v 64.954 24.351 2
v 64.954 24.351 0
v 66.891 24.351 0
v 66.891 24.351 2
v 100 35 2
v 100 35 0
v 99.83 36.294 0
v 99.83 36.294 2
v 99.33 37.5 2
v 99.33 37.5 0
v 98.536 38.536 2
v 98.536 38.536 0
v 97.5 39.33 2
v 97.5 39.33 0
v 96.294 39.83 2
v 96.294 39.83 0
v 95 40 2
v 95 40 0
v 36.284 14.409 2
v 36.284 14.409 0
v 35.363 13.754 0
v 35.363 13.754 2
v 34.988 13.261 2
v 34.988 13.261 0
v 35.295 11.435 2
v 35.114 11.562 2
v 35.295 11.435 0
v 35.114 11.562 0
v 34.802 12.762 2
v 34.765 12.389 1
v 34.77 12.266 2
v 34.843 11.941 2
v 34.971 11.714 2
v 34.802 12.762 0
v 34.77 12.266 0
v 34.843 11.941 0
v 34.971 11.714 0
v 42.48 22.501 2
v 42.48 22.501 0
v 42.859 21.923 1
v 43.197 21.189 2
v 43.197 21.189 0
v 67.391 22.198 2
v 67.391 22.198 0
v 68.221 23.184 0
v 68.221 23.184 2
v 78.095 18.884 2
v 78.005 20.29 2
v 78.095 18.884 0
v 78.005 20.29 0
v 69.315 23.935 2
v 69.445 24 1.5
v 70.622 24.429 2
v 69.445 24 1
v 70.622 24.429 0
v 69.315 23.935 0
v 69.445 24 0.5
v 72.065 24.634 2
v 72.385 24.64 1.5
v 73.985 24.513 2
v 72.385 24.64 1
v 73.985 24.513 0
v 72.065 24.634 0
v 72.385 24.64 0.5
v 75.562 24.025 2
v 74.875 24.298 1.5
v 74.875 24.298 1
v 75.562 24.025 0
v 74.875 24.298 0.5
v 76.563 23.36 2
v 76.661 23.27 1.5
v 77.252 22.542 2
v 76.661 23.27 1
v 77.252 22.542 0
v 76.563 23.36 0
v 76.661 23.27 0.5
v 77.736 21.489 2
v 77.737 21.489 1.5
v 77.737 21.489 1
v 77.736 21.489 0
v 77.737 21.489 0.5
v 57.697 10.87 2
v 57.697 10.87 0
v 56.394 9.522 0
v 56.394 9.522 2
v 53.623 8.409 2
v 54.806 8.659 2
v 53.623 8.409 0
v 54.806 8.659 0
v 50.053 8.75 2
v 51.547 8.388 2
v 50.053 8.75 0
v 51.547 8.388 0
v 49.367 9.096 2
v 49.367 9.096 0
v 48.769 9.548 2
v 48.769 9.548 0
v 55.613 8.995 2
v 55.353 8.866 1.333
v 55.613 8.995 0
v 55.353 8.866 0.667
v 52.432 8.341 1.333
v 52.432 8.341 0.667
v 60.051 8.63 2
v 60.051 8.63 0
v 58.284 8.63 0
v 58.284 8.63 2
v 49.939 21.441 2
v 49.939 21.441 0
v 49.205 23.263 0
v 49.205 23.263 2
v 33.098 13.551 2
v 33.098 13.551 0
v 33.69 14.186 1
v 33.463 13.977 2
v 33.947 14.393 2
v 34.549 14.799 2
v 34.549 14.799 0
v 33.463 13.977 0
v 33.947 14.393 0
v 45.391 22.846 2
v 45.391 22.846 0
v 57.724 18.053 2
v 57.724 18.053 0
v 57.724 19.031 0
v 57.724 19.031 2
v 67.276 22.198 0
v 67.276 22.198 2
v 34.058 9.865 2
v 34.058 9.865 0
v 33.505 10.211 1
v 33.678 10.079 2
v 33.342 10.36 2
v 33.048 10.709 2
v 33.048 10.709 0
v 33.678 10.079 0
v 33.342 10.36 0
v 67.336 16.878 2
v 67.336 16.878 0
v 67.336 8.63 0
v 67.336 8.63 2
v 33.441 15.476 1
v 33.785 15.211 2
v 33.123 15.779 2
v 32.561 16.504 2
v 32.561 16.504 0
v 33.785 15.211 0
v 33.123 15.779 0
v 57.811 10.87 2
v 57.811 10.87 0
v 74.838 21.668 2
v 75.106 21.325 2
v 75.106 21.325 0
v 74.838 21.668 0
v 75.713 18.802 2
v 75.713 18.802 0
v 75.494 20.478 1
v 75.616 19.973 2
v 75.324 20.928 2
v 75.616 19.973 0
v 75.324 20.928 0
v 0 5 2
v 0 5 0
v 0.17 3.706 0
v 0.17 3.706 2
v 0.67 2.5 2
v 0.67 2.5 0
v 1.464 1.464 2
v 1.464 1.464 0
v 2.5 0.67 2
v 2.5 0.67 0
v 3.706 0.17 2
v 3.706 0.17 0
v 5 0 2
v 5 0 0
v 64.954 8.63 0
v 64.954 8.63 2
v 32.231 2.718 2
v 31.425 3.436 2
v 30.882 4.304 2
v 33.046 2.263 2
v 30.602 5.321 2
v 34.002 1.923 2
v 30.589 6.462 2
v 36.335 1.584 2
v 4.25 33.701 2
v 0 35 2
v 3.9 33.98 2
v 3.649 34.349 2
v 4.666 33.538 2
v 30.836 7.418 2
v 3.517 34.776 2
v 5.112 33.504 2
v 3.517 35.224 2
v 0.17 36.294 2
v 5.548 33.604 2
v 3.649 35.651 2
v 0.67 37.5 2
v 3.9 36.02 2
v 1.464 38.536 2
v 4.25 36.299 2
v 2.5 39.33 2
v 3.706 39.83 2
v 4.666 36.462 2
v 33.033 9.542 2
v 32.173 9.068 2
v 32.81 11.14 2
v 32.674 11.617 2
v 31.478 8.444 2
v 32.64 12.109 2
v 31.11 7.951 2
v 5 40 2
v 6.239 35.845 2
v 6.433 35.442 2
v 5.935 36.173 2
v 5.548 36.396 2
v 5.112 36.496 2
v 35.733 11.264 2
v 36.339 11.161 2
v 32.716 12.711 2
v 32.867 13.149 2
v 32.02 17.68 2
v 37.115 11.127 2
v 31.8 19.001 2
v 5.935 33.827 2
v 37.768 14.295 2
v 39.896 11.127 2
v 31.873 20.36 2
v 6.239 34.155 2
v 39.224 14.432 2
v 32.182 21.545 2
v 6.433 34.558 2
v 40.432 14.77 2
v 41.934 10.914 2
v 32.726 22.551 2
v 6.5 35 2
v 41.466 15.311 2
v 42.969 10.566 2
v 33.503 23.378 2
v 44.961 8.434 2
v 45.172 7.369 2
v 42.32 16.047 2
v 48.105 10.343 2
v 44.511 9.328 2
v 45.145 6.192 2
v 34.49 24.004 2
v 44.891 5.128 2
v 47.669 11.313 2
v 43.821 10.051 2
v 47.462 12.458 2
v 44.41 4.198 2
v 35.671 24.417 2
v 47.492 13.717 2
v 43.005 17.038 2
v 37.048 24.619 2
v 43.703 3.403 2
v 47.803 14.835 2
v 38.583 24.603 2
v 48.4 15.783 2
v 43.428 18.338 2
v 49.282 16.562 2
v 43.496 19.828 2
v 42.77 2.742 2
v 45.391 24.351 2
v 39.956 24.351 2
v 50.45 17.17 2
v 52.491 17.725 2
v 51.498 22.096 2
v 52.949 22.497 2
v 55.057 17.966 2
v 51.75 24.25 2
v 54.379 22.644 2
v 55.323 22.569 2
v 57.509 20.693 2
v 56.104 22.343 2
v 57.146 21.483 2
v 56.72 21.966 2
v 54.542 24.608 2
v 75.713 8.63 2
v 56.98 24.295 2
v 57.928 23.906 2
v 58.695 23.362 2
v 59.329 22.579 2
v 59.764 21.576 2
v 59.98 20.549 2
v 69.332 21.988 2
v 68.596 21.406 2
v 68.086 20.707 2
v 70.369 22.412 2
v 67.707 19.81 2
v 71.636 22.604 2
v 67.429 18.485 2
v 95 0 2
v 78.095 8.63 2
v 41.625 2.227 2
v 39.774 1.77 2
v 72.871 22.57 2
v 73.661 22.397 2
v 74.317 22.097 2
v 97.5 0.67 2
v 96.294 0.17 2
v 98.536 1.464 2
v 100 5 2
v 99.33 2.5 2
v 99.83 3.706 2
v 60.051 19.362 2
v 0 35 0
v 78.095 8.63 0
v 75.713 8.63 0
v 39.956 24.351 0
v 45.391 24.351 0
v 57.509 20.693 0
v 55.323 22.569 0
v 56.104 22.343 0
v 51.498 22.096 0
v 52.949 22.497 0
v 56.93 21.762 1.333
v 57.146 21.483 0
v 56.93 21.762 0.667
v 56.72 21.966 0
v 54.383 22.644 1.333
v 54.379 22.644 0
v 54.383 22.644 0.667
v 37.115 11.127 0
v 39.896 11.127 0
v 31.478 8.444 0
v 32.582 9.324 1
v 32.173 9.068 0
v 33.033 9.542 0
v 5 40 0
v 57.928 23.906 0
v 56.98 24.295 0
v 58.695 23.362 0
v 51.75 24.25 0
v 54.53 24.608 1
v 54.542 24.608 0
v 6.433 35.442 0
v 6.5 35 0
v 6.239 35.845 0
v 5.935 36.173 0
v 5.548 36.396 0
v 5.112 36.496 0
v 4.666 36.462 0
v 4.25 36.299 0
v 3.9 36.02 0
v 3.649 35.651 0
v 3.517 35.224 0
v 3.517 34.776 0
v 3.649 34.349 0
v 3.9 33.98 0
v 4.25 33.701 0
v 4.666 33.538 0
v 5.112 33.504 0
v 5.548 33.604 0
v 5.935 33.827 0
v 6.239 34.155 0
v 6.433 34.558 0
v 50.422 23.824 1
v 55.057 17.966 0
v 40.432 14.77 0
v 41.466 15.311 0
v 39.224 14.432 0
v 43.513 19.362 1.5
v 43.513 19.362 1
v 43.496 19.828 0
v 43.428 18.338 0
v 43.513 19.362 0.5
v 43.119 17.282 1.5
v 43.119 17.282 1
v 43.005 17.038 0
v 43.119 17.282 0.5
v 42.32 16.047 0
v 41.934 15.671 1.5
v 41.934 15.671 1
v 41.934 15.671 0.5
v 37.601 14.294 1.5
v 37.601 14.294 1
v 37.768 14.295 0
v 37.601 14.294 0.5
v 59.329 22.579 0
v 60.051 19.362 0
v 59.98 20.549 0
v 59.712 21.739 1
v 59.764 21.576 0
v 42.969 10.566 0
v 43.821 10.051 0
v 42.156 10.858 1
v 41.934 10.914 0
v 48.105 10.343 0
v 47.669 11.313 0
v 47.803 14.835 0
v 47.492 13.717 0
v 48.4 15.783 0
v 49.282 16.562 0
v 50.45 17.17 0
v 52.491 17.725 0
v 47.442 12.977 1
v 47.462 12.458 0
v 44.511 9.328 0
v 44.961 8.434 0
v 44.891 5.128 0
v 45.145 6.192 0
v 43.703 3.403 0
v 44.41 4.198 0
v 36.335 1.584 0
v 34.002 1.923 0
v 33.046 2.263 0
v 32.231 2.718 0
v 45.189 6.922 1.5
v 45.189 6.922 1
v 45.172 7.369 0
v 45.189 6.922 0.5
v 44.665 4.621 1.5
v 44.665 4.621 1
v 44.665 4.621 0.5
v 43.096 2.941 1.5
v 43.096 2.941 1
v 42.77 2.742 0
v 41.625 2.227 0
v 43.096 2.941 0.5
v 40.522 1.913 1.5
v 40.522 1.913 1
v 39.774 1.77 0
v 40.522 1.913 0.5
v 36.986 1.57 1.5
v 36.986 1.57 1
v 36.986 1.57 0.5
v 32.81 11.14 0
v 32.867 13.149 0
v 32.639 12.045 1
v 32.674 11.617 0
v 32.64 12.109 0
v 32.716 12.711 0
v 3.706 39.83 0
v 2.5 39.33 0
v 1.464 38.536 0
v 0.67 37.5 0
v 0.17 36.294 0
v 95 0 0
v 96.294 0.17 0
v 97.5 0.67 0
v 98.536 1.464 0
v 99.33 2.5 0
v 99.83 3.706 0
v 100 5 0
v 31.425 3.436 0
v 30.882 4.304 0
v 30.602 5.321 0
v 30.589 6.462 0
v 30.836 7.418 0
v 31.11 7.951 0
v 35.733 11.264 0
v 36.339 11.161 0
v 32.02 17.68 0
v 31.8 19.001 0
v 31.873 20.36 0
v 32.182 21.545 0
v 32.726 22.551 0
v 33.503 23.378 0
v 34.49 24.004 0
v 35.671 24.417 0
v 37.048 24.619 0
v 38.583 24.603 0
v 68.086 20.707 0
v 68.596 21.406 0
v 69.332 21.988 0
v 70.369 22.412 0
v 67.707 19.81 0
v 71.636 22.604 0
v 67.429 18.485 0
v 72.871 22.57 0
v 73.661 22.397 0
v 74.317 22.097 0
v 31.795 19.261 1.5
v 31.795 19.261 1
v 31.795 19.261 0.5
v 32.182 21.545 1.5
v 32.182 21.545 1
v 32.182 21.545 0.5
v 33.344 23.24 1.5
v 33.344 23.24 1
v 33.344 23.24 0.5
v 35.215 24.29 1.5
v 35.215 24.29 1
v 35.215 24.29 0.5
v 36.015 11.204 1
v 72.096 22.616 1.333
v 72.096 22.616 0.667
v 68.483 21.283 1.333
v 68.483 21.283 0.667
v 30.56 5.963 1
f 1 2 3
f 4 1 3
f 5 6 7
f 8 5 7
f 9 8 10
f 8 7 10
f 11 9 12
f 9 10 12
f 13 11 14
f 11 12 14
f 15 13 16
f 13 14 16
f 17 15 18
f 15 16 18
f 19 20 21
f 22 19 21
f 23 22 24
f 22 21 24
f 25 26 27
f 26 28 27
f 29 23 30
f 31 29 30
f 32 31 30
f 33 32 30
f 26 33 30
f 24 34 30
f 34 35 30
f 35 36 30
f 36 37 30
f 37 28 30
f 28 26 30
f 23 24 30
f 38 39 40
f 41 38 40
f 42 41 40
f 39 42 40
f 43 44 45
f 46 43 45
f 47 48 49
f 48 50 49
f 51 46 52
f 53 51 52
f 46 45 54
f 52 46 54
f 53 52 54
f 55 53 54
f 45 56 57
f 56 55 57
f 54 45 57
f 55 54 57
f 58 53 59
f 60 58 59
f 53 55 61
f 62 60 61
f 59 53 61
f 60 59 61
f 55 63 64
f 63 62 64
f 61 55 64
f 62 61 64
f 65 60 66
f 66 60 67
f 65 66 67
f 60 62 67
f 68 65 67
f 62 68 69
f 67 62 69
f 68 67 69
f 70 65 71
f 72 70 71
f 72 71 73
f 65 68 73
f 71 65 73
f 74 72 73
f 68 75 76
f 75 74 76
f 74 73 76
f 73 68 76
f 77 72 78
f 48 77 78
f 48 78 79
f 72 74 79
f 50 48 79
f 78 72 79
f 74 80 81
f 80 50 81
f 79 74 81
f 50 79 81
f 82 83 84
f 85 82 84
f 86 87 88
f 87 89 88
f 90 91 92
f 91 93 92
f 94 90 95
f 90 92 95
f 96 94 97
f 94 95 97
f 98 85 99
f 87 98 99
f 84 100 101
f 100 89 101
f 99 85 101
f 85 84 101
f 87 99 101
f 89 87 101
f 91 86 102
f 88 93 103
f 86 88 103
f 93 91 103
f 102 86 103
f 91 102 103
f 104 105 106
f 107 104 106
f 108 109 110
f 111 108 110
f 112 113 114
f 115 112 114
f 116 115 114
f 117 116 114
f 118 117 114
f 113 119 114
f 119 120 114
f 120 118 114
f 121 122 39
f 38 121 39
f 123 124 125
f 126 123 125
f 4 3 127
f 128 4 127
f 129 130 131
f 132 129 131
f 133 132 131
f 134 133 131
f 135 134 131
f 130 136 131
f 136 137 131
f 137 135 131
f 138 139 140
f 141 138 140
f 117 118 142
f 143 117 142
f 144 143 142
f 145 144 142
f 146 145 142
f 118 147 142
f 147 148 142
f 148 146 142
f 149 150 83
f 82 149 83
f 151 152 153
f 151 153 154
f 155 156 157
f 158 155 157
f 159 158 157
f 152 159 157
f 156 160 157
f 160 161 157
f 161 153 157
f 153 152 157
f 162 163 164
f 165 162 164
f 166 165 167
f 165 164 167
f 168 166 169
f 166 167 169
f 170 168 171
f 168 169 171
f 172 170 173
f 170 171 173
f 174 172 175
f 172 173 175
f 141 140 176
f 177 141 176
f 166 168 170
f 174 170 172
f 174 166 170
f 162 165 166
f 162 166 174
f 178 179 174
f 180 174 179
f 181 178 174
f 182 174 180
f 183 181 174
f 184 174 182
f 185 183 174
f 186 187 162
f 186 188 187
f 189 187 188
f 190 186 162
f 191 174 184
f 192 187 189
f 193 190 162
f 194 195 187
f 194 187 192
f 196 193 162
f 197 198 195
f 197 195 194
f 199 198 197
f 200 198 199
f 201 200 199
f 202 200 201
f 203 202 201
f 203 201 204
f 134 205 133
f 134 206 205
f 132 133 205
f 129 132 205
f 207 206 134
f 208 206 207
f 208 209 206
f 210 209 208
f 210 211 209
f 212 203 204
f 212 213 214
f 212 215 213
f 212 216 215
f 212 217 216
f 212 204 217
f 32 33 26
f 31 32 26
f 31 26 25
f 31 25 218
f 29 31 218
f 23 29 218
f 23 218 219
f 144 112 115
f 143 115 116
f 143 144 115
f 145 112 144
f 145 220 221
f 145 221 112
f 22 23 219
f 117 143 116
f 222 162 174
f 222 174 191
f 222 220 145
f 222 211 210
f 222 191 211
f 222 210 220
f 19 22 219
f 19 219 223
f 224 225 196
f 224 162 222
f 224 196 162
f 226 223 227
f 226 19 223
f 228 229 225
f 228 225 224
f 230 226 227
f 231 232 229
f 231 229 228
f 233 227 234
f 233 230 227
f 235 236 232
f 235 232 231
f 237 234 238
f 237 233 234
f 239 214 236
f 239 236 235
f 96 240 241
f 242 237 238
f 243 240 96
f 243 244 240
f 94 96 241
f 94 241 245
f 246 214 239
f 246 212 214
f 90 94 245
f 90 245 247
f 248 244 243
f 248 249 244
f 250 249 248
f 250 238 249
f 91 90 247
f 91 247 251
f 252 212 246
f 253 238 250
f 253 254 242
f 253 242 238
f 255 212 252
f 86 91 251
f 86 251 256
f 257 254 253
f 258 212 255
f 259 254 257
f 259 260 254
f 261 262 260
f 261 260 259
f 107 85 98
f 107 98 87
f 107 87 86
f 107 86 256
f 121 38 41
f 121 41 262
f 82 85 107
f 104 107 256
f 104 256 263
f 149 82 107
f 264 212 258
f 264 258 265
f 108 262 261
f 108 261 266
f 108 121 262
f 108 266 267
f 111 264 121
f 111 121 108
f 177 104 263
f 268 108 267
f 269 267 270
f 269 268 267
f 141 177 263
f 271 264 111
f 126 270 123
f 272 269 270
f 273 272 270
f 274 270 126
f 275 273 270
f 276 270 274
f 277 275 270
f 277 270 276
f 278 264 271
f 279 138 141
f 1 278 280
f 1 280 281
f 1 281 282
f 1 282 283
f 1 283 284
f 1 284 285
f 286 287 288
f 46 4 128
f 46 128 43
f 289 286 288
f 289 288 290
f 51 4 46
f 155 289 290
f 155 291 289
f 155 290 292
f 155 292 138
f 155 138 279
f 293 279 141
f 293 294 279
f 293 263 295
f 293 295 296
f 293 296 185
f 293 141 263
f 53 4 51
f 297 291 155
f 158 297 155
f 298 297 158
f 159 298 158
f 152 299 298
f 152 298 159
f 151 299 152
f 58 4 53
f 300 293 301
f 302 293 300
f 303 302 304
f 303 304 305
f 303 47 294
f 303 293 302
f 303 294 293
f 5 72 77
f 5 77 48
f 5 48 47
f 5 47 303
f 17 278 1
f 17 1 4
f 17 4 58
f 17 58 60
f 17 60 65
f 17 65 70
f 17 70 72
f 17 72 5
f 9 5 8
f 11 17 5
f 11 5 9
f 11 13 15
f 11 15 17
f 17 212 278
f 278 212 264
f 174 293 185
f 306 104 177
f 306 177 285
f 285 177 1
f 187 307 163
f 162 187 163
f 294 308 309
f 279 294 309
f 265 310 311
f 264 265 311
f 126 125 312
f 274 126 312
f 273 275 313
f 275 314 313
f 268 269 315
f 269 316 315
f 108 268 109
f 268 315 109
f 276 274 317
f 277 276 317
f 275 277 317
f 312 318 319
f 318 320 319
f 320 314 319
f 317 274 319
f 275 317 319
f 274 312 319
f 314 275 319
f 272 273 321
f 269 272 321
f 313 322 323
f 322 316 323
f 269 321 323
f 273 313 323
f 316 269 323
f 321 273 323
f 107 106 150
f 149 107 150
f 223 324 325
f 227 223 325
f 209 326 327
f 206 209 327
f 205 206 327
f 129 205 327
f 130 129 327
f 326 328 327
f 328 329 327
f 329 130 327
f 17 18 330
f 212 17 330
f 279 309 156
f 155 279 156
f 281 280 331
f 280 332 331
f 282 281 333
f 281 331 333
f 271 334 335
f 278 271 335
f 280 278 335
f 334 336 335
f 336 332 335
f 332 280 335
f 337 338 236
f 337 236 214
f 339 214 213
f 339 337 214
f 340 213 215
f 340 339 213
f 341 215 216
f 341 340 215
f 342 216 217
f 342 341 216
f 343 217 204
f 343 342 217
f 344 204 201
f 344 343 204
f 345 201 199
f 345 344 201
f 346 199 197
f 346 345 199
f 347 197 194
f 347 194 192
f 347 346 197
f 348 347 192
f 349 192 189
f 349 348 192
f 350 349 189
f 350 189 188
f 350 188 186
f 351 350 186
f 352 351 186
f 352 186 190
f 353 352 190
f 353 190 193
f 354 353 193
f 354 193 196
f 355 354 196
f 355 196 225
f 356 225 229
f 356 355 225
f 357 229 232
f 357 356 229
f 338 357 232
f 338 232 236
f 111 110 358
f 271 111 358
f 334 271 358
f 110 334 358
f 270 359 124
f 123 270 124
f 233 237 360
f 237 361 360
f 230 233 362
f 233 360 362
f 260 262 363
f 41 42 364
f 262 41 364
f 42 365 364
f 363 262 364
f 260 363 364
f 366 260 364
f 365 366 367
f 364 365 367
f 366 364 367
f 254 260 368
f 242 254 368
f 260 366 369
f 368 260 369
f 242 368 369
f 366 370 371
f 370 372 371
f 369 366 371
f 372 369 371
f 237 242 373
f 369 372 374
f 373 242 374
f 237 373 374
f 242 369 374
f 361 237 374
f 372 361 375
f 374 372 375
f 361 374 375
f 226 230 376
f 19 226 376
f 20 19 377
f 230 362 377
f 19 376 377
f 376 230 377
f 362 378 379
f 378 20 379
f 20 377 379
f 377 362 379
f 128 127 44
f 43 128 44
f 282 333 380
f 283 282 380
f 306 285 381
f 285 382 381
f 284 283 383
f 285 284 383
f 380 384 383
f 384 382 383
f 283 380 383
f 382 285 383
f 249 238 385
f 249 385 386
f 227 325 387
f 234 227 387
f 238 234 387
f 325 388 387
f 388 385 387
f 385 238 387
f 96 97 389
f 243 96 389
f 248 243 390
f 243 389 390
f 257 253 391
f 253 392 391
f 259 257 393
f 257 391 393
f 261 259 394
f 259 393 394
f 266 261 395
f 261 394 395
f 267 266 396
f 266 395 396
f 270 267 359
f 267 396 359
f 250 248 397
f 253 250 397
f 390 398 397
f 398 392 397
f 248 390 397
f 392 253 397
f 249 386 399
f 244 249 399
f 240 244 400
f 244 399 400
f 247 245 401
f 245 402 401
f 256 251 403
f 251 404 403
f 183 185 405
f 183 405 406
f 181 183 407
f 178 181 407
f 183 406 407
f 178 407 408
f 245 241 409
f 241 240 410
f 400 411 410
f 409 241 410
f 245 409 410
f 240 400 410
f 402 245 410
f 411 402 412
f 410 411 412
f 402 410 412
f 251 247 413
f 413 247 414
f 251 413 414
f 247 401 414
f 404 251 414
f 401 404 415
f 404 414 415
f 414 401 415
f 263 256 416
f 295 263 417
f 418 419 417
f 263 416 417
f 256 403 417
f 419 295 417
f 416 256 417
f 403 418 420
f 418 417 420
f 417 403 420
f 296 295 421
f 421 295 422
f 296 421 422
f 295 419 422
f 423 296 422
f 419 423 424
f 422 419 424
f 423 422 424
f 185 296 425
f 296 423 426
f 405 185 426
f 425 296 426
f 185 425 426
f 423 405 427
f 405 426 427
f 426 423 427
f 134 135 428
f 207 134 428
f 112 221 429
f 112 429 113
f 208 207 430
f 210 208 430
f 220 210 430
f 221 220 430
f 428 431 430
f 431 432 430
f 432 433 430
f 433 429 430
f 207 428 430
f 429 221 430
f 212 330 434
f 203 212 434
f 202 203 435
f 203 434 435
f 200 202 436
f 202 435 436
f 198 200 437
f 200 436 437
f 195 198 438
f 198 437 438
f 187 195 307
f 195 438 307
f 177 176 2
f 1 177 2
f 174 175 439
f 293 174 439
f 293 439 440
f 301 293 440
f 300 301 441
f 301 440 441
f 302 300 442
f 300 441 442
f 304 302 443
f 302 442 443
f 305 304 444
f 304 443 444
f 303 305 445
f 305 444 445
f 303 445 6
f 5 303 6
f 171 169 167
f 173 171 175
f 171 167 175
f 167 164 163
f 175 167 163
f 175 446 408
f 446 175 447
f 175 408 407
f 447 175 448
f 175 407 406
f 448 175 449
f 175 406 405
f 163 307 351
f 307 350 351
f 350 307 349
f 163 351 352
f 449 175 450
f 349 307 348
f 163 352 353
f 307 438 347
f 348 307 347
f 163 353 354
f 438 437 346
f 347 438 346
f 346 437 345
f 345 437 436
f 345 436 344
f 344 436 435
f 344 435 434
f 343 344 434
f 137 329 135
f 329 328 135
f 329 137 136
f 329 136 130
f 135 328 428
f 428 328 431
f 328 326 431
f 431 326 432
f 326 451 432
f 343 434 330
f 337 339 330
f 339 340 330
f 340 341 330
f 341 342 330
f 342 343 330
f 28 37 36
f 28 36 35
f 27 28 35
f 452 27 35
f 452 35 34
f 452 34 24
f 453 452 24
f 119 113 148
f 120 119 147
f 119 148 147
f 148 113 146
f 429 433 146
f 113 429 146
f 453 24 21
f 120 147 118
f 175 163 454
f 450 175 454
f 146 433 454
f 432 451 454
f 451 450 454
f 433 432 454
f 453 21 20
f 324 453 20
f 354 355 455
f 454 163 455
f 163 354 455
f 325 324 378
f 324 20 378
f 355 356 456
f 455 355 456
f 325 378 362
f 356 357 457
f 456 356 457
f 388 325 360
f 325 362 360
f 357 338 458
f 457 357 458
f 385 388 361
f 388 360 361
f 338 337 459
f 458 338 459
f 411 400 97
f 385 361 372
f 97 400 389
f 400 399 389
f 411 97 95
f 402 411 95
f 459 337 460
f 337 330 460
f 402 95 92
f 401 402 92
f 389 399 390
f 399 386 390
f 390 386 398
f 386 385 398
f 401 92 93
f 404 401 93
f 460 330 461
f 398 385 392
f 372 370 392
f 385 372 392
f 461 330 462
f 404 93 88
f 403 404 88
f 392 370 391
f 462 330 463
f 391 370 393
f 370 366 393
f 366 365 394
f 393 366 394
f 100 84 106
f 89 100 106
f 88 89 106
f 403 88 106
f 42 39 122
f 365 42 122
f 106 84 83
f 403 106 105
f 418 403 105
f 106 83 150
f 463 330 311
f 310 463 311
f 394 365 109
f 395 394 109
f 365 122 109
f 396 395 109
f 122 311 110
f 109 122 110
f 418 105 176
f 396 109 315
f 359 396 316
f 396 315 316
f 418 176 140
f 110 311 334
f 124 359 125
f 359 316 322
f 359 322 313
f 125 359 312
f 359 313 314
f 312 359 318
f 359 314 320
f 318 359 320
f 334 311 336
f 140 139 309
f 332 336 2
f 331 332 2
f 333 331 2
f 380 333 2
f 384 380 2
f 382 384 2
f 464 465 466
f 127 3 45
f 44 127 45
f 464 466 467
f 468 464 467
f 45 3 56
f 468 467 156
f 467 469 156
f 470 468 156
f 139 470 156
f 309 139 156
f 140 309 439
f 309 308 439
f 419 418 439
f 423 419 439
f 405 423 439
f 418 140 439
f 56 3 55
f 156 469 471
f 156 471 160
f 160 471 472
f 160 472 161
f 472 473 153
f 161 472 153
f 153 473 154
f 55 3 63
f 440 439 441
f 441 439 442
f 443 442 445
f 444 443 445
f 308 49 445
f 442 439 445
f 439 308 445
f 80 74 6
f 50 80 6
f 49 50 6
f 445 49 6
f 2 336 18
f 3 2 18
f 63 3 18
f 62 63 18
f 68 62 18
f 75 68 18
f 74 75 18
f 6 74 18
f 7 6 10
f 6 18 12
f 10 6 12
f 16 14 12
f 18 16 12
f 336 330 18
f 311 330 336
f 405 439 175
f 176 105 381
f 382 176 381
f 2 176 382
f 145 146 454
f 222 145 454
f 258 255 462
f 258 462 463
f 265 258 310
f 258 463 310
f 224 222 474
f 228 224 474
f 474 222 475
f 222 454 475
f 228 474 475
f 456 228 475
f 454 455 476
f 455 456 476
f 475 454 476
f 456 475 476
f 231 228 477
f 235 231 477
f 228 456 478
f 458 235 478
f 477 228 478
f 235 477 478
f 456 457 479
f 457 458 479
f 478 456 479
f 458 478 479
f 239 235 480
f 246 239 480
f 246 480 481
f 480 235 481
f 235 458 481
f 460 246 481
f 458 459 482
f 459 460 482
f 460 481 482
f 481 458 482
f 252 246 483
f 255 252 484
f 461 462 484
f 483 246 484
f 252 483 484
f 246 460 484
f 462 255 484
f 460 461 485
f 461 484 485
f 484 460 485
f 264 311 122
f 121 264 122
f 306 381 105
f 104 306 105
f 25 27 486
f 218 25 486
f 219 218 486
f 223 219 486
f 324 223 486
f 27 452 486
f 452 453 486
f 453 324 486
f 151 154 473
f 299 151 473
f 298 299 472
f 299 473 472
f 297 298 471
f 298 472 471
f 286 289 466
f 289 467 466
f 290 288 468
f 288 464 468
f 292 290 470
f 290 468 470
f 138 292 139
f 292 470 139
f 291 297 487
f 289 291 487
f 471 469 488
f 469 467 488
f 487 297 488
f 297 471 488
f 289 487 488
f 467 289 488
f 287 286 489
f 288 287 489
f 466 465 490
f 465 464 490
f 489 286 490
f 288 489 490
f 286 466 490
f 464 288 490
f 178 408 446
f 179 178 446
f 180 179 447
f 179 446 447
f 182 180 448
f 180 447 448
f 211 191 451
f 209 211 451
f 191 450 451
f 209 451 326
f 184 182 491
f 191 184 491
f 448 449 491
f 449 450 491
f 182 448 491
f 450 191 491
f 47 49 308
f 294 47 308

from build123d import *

# Parameters (mm, degrees)
F0_R     = 1.5
F1_DEPTH = 2


with BuildPart() as f1:
    # F0 (on Top) → F1 (new body)
    with BuildSketch(Plane.XY):
        with BuildLine():
            Line((95, 40), (5, 40))
            ThreePointArc((5, 40), (1.4644660941, 38.5355339059), (0, 35))
            Line((0, 35), (0, 5))
            ThreePointArc((0, 5), (1.4644660941, 1.4644660941), (5, 0))
            Line((5, 0), (95, 0))
            ThreePointArc((95, 0), (98.5355339059, 1.4644660941), (100, 5))
            Line((100, 5), (100, 35))
            ThreePointArc((100, 35), (98.5355339059, 38.5355339059), (95, 40))
        make_face()
        with BuildLine():
            Line((39.9559350041, 24.3510830572), (45.390617828, 24.3510830572))
            Line((45.390617828, 24.3510830572), (45.390617828, 22.8455290317))
            Line((45.390617828, 22.8455290317), (42.4804920591, 22.5012712515))
            add(Edge.make_bspline(
                [(42.4804920591, 22.5012712515), (42.8798310842, 22.0009499442), (43.196548242, 21.1885015829)],
                knots=[0, 0, 0, 1, 1, 1], degree=2))
            add(Edge.make_bspline(
                [(43.196548242, 21.1885015829), (43.5132653998, 20.3760532215), (43.5132653998, 19.3616402958)],
                knots=[0, 0, 0, 1, 1, 1], degree=2))
            add(Edge.make_bspline(
                [(43.5132653998, 19.3616402958), (43.5132653998, 17.0482280127), (41.9342697145, 15.6711968918)],
                knots=[0, 0, 0, 1, 1, 1], degree=2))
            add(Edge.make_bspline(
                [(41.9342697145, 15.6711968918), (40.3552740292, 14.2941657709), (37.6012117874, 14.2941657709)],
                knots=[0, 0, 0, 1, 1, 1], degree=2))
            add(Edge.make_bspline(
                [(37.6012117874, 14.2941657709), (36.8989259157, 14.2941657709), (36.2838520151, 14.4089183643)],
                knots=[0, 0, 0, 1, 1, 1], degree=2))
            add(Edge.make_bspline(
                [(36.2838520151, 14.4089183643), (34.7645276783, 13.6056502104), (34.7645276783, 12.3892727203)],
                knots=[0, 0, 0, 1, 1, 1], degree=2))
            add(Edge.make_bspline(
                [(34.7645276783, 12.3892727203), (34.7645276783, 11.7420680935), (35.2946846599, 11.4345311431)],
                knots=[0, 0, 0, 1, 1, 1], degree=2))
            add(Edge.make_bspline(
                [(35.2946846599, 11.4345311431), (35.8248416414, 11.1269941928), (37.1146607913, 11.1269941928)],
                knots=[0, 0, 0, 1, 1, 1], degree=2))
            Line((37.1146607913, 11.1269941928), (39.8962636556, 11.1269941928))
            add(Edge.make_bspline(
                [(39.8962636556, 11.1269941928), (42.4529514367, 11.1269941928), (43.8208023501, 10.0506148666)],
                knots=[0, 0, 0, 1, 1, 1], degree=2))
            add(Edge.make_bspline(
                [(43.8208023501, 10.0506148666), (45.1886532636, 8.9742355405), (45.1886532636, 6.9224591703)],
                knots=[0, 0, 0, 1, 1, 1], degree=2))
            add(Edge.make_bspline(
                [(45.1886532636, 6.9224591703), (45.1886532636, 4.3106901443), (43.0955659598, 2.940544179)],
                knots=[0, 0, 0, 1, 1, 1], degree=2))
            add(Edge.make_bspline(
                [(43.0955659598, 2.940544179), (41.002478656, 1.5703982137), (36.9861378867, 1.5703982137)],
                knots=[0, 0, 0, 1, 1, 1], degree=2))
            add(Edge.make_bspline(
                [(36.9861378867, 1.5703982137), (33.9015881759, 1.5703982137), (32.2307904159, 2.7179241478)],
                knots=[0, 0, 0, 1, 1, 1], degree=2))
            add(Edge.make_bspline(
                [(32.2307904159, 2.7179241478), (30.5599926558, 3.8654500819), (30.5599926558, 5.9631274894)],
                knots=[0, 0, 0, 1, 1, 1], degree=2))
            add(Edge.make_bspline(
                [(30.5599926558, 5.9631274894), (30.5599926558, 7.3952398552), (31.4780134031, 8.4440785589)],
                knots=[0, 0, 0, 1, 1, 1], degree=2))
            add(Edge.make_bspline(
                [(31.4780134031, 8.4440785589), (32.3960341504, 9.4929172627), (34.0576517029, 9.8647156653)],
                knots=[0, 0, 0, 1, 1, 1], degree=2))
            add(Edge.make_bspline(
                [(34.0576517029, 9.8647156653), (33.4563481135, 10.1355317858), (33.0478288809, 10.7092947528)],
                knots=[0, 0, 0, 1, 1, 1], degree=2))
            add(Edge.make_bspline(
                [(33.0478288809, 10.7092947528), (32.6393096484, 11.2830577198), (32.6393096484, 12.0450149401)],
                knots=[0, 0, 0, 1, 1, 1], degree=2))
            add(Edge.make_bspline(
                [(32.6393096484, 12.0450149401), (32.6393096484, 12.9033643388), (33.098320022, 13.5505689656)],
                knots=[0, 0, 0, 1, 1, 1], degree=2))
            add(Edge.make_bspline(
                [(33.098320022, 13.5505689656), (33.5573303957, 14.1977735924), (34.5487928027, 14.7990771819)],
                knots=[0, 0, 0, 1, 1, 1], degree=2))
            add(Edge.make_bspline(
                [(34.5487928027, 14.7990771819), (33.3278252088, 15.2993984891), (32.5612778849, 16.5043007199)],
                knots=[0, 0, 0, 1, 1, 1], degree=2))
            add(Edge.make_bspline(
                [(32.5612778849, 16.5043007199), (31.7947305609, 17.7092029507), (31.7947305609, 19.2606580136)],
                knots=[0, 0, 0, 1, 1, 1], degree=2))
            add(Edge.make_bspline(
                [(31.7947305609, 19.2606580136), (31.7947305609, 21.8402963134), (33.3438905719, 23.240277953)],
                knots=[0, 0, 0, 1, 1, 1], degree=2))
            add(Edge.make_bspline(
                [(33.3438905719, 23.240277953), (34.8930505829, 24.6402595926), (37.729734692, 24.6402595926)],
                knots=[0, 0, 0, 1, 1, 1], degree=2))
            add(Edge.make_bspline(
                [(37.729734692, 24.6402595926), (38.9644725971, 24.6402595926), (39.9559350041, 24.3510830572)],
                knots=[0, 0, 0, 1, 1, 1], degree=2))
        make_face(mode=Mode.SUBTRACT)
        with BuildLine():
            Line((60.0514091618, 8.6299777602), (58.2842192234, 8.6299777602))
            Line((58.2842192234, 8.6299777602), (57.8114385385, 10.8699483836))
            Line((57.8114385385, 10.8699483836), (57.6966859451, 10.8699483836))
            add(Edge.make_bspline(
                [(57.6966859451, 10.8699483836), (56.5216193886, 9.3919349805), (55.3534379877, 8.8663681027)],
                knots=[0, 0, 0, 1, 1, 1], degree=2))
            add(Edge.make_bspline(
                [(55.3534379877, 8.8663681027), (54.1852565868, 8.3408012249), (52.4318369595, 8.3408012249)],
                knots=[0, 0, 0, 1, 1, 1], degree=2))
            add(Edge.make_bspline(
                [(52.4318369595, 8.3408012249), (50.0954741577, 8.3408012249), (48.7689341779, 9.5479985075)],
                knots=[0, 0, 0, 1, 1, 1], degree=2))
            add(Edge.make_bspline(
                [(48.7689341779, 9.5479985075), (47.4423941981, 10.7551957902), (47.4423941981, 12.9768059986)],
                knots=[0, 0, 0, 1, 1, 1], degree=2))
            add(Edge.make_bspline(
                [(47.4423941981, 12.9768059986), (47.4423941981, 17.7367435731), (55.0573762967, 17.96624876)],
                knots=[0, 0, 0, 1, 1, 1], degree=2))
            Line((55.0573762967, 17.96624876), (57.7242265675, 18.053460731))
            Line((57.7242265675, 18.053460731), (57.7242265675, 19.0311528268))
            add(Edge.make_bspline(
                [(57.7242265675, 19.0311528268), (57.7242265675, 20.8809646325), (56.9301386211, 21.7622645499)],
                knots=[0, 0, 0, 1, 1, 1], degree=2))
            add(Edge.make_bspline(
                [(56.9301386211, 21.7622645499), (56.1360506747, 22.6435644673), (54.3826310475, 22.6435644673)],
                knots=[0, 0, 0, 1, 1, 1], degree=2))
            add(Edge.make_bspline(
                [(54.3826310475, 22.6435644673), (52.4180666483, 22.6435644673), (49.9394106307, 21.4409572884)],
                knots=[0, 0, 0, 1, 1, 1], degree=2))
            Line((49.9394106307, 21.4409572884), (49.2049940329, 23.2632284717))
            add(Edge.make_bspline(
                [(49.2049940329, 23.2632284717), (50.3662902782, 23.8920726836), (51.7502065547, 24.250100775)],
                knots=[0, 0, 0, 1, 1, 1], degree=2))
            add(Edge.make_bspline(
                [(51.7502065547, 24.250100775), (53.1341228312, 24.6081288665), (54.529514367, 24.6081288665)],
                knots=[0, 0, 0, 1, 1, 1], degree=2))
            add(Edge.make_bspline(
                [(54.529514367, 24.6081288665), (57.3386578537, 24.6081288665), (58.6950335078, 23.361915702)],
                knots=[0, 0, 0, 1, 1, 1], degree=2))
            add(Edge.make_bspline(
                [(58.6950335078, 23.361915702), (60.0514091618, 22.1157025376), (60.0514091618, 19.3616402958)],
                knots=[0, 0, 0, 1, 1, 1], degree=2))
            Line((60.0514091618, 19.3616402958), (60.0514091618, 8.6299777602))
        make_face(mode=Mode.SUBTRACT)
        with BuildLine():
            Line((78.0951069494, 8.6299777602), (75.7128431103, 8.6299777602))
            Line((75.7128431103, 8.6299777602), (75.7128431103, 18.80164764))
            add(Edge.make_bspline(
                [(75.7128431103, 18.80164764), (75.7128431103, 20.7203110018), (74.8384283485, 21.6681674233)],
                knots=[0, 0, 0, 1, 1, 1], degree=2))
            add(Edge.make_bspline(
                [(74.8384283485, 21.6681674233), (73.9640135867, 22.6160238449), (72.095841366, 22.6160238449)],
                knots=[0, 0, 0, 1, 1, 1], degree=2))
            add(Edge.make_bspline(
                [(72.095841366, 22.6160238449), (69.6309556596, 22.6160238449), (68.4834297255, 21.2825987095)],
                knots=[0, 0, 0, 1, 1, 1], degree=2))
            add(Edge.make_bspline(
                [(68.4834297255, 21.2825987095), (67.3359037914, 19.9491735741), (67.3359037914, 16.8783941745)],
                knots=[0, 0, 0, 1, 1, 1], degree=2))
            Line((67.3359037914, 16.8783941745), (67.3359037914, 8.6299777602))
            Line((67.3359037914, 8.6299777602), (64.9536399523, 8.6299777602))
            Line((64.9536399523, 8.6299777602), (64.9536399523, 24.3510830572))
            Line((64.9536399523, 24.3510830572), (66.890663729, 24.3510830572))
            Line((66.890663729, 24.3510830572), (67.2762324429, 22.1983244049))
            Line((67.2762324429, 22.1983244049), (67.3909850363, 22.1983244049))
            add(Edge.make_bspline(
                [(67.3909850363, 22.1983244049), (68.1254016341, 23.3596206502), (69.4450564583, 23.9999401214)],
                knots=[0, 0, 0, 1, 1, 1], degree=2))
            add(Edge.make_bspline(
                [(69.4450564583, 23.9999401214), (70.7647112825, 24.6402595926), (72.3850179014, 24.6402595926)],
                knots=[0, 0, 0, 1, 1, 1], degree=2))
            add(Edge.make_bspline(
                [(72.3850179014, 24.6402595926), (75.2262921142, 24.6402595926), (76.6606995318, 23.2701136273)],
                knots=[0, 0, 0, 1, 1, 1], degree=2))
            add(Edge.make_bspline(
                [(76.6606995318, 23.2701136273), (78.0951069494, 21.899967662), (78.0951069494, 18.8842695072)],
                knots=[0, 0, 0, 1, 1, 1], degree=2))
            Line((78.0951069494, 18.8842695072), (78.0951069494, 8.6299777602))
        make_face(mode=Mode.SUBTRACT)
        with Locations((5, 35)):
            Circle(F0_R, mode=Mode.SUBTRACT)
    extrude(amount=F1_DEPTH)


solid = f1.part
